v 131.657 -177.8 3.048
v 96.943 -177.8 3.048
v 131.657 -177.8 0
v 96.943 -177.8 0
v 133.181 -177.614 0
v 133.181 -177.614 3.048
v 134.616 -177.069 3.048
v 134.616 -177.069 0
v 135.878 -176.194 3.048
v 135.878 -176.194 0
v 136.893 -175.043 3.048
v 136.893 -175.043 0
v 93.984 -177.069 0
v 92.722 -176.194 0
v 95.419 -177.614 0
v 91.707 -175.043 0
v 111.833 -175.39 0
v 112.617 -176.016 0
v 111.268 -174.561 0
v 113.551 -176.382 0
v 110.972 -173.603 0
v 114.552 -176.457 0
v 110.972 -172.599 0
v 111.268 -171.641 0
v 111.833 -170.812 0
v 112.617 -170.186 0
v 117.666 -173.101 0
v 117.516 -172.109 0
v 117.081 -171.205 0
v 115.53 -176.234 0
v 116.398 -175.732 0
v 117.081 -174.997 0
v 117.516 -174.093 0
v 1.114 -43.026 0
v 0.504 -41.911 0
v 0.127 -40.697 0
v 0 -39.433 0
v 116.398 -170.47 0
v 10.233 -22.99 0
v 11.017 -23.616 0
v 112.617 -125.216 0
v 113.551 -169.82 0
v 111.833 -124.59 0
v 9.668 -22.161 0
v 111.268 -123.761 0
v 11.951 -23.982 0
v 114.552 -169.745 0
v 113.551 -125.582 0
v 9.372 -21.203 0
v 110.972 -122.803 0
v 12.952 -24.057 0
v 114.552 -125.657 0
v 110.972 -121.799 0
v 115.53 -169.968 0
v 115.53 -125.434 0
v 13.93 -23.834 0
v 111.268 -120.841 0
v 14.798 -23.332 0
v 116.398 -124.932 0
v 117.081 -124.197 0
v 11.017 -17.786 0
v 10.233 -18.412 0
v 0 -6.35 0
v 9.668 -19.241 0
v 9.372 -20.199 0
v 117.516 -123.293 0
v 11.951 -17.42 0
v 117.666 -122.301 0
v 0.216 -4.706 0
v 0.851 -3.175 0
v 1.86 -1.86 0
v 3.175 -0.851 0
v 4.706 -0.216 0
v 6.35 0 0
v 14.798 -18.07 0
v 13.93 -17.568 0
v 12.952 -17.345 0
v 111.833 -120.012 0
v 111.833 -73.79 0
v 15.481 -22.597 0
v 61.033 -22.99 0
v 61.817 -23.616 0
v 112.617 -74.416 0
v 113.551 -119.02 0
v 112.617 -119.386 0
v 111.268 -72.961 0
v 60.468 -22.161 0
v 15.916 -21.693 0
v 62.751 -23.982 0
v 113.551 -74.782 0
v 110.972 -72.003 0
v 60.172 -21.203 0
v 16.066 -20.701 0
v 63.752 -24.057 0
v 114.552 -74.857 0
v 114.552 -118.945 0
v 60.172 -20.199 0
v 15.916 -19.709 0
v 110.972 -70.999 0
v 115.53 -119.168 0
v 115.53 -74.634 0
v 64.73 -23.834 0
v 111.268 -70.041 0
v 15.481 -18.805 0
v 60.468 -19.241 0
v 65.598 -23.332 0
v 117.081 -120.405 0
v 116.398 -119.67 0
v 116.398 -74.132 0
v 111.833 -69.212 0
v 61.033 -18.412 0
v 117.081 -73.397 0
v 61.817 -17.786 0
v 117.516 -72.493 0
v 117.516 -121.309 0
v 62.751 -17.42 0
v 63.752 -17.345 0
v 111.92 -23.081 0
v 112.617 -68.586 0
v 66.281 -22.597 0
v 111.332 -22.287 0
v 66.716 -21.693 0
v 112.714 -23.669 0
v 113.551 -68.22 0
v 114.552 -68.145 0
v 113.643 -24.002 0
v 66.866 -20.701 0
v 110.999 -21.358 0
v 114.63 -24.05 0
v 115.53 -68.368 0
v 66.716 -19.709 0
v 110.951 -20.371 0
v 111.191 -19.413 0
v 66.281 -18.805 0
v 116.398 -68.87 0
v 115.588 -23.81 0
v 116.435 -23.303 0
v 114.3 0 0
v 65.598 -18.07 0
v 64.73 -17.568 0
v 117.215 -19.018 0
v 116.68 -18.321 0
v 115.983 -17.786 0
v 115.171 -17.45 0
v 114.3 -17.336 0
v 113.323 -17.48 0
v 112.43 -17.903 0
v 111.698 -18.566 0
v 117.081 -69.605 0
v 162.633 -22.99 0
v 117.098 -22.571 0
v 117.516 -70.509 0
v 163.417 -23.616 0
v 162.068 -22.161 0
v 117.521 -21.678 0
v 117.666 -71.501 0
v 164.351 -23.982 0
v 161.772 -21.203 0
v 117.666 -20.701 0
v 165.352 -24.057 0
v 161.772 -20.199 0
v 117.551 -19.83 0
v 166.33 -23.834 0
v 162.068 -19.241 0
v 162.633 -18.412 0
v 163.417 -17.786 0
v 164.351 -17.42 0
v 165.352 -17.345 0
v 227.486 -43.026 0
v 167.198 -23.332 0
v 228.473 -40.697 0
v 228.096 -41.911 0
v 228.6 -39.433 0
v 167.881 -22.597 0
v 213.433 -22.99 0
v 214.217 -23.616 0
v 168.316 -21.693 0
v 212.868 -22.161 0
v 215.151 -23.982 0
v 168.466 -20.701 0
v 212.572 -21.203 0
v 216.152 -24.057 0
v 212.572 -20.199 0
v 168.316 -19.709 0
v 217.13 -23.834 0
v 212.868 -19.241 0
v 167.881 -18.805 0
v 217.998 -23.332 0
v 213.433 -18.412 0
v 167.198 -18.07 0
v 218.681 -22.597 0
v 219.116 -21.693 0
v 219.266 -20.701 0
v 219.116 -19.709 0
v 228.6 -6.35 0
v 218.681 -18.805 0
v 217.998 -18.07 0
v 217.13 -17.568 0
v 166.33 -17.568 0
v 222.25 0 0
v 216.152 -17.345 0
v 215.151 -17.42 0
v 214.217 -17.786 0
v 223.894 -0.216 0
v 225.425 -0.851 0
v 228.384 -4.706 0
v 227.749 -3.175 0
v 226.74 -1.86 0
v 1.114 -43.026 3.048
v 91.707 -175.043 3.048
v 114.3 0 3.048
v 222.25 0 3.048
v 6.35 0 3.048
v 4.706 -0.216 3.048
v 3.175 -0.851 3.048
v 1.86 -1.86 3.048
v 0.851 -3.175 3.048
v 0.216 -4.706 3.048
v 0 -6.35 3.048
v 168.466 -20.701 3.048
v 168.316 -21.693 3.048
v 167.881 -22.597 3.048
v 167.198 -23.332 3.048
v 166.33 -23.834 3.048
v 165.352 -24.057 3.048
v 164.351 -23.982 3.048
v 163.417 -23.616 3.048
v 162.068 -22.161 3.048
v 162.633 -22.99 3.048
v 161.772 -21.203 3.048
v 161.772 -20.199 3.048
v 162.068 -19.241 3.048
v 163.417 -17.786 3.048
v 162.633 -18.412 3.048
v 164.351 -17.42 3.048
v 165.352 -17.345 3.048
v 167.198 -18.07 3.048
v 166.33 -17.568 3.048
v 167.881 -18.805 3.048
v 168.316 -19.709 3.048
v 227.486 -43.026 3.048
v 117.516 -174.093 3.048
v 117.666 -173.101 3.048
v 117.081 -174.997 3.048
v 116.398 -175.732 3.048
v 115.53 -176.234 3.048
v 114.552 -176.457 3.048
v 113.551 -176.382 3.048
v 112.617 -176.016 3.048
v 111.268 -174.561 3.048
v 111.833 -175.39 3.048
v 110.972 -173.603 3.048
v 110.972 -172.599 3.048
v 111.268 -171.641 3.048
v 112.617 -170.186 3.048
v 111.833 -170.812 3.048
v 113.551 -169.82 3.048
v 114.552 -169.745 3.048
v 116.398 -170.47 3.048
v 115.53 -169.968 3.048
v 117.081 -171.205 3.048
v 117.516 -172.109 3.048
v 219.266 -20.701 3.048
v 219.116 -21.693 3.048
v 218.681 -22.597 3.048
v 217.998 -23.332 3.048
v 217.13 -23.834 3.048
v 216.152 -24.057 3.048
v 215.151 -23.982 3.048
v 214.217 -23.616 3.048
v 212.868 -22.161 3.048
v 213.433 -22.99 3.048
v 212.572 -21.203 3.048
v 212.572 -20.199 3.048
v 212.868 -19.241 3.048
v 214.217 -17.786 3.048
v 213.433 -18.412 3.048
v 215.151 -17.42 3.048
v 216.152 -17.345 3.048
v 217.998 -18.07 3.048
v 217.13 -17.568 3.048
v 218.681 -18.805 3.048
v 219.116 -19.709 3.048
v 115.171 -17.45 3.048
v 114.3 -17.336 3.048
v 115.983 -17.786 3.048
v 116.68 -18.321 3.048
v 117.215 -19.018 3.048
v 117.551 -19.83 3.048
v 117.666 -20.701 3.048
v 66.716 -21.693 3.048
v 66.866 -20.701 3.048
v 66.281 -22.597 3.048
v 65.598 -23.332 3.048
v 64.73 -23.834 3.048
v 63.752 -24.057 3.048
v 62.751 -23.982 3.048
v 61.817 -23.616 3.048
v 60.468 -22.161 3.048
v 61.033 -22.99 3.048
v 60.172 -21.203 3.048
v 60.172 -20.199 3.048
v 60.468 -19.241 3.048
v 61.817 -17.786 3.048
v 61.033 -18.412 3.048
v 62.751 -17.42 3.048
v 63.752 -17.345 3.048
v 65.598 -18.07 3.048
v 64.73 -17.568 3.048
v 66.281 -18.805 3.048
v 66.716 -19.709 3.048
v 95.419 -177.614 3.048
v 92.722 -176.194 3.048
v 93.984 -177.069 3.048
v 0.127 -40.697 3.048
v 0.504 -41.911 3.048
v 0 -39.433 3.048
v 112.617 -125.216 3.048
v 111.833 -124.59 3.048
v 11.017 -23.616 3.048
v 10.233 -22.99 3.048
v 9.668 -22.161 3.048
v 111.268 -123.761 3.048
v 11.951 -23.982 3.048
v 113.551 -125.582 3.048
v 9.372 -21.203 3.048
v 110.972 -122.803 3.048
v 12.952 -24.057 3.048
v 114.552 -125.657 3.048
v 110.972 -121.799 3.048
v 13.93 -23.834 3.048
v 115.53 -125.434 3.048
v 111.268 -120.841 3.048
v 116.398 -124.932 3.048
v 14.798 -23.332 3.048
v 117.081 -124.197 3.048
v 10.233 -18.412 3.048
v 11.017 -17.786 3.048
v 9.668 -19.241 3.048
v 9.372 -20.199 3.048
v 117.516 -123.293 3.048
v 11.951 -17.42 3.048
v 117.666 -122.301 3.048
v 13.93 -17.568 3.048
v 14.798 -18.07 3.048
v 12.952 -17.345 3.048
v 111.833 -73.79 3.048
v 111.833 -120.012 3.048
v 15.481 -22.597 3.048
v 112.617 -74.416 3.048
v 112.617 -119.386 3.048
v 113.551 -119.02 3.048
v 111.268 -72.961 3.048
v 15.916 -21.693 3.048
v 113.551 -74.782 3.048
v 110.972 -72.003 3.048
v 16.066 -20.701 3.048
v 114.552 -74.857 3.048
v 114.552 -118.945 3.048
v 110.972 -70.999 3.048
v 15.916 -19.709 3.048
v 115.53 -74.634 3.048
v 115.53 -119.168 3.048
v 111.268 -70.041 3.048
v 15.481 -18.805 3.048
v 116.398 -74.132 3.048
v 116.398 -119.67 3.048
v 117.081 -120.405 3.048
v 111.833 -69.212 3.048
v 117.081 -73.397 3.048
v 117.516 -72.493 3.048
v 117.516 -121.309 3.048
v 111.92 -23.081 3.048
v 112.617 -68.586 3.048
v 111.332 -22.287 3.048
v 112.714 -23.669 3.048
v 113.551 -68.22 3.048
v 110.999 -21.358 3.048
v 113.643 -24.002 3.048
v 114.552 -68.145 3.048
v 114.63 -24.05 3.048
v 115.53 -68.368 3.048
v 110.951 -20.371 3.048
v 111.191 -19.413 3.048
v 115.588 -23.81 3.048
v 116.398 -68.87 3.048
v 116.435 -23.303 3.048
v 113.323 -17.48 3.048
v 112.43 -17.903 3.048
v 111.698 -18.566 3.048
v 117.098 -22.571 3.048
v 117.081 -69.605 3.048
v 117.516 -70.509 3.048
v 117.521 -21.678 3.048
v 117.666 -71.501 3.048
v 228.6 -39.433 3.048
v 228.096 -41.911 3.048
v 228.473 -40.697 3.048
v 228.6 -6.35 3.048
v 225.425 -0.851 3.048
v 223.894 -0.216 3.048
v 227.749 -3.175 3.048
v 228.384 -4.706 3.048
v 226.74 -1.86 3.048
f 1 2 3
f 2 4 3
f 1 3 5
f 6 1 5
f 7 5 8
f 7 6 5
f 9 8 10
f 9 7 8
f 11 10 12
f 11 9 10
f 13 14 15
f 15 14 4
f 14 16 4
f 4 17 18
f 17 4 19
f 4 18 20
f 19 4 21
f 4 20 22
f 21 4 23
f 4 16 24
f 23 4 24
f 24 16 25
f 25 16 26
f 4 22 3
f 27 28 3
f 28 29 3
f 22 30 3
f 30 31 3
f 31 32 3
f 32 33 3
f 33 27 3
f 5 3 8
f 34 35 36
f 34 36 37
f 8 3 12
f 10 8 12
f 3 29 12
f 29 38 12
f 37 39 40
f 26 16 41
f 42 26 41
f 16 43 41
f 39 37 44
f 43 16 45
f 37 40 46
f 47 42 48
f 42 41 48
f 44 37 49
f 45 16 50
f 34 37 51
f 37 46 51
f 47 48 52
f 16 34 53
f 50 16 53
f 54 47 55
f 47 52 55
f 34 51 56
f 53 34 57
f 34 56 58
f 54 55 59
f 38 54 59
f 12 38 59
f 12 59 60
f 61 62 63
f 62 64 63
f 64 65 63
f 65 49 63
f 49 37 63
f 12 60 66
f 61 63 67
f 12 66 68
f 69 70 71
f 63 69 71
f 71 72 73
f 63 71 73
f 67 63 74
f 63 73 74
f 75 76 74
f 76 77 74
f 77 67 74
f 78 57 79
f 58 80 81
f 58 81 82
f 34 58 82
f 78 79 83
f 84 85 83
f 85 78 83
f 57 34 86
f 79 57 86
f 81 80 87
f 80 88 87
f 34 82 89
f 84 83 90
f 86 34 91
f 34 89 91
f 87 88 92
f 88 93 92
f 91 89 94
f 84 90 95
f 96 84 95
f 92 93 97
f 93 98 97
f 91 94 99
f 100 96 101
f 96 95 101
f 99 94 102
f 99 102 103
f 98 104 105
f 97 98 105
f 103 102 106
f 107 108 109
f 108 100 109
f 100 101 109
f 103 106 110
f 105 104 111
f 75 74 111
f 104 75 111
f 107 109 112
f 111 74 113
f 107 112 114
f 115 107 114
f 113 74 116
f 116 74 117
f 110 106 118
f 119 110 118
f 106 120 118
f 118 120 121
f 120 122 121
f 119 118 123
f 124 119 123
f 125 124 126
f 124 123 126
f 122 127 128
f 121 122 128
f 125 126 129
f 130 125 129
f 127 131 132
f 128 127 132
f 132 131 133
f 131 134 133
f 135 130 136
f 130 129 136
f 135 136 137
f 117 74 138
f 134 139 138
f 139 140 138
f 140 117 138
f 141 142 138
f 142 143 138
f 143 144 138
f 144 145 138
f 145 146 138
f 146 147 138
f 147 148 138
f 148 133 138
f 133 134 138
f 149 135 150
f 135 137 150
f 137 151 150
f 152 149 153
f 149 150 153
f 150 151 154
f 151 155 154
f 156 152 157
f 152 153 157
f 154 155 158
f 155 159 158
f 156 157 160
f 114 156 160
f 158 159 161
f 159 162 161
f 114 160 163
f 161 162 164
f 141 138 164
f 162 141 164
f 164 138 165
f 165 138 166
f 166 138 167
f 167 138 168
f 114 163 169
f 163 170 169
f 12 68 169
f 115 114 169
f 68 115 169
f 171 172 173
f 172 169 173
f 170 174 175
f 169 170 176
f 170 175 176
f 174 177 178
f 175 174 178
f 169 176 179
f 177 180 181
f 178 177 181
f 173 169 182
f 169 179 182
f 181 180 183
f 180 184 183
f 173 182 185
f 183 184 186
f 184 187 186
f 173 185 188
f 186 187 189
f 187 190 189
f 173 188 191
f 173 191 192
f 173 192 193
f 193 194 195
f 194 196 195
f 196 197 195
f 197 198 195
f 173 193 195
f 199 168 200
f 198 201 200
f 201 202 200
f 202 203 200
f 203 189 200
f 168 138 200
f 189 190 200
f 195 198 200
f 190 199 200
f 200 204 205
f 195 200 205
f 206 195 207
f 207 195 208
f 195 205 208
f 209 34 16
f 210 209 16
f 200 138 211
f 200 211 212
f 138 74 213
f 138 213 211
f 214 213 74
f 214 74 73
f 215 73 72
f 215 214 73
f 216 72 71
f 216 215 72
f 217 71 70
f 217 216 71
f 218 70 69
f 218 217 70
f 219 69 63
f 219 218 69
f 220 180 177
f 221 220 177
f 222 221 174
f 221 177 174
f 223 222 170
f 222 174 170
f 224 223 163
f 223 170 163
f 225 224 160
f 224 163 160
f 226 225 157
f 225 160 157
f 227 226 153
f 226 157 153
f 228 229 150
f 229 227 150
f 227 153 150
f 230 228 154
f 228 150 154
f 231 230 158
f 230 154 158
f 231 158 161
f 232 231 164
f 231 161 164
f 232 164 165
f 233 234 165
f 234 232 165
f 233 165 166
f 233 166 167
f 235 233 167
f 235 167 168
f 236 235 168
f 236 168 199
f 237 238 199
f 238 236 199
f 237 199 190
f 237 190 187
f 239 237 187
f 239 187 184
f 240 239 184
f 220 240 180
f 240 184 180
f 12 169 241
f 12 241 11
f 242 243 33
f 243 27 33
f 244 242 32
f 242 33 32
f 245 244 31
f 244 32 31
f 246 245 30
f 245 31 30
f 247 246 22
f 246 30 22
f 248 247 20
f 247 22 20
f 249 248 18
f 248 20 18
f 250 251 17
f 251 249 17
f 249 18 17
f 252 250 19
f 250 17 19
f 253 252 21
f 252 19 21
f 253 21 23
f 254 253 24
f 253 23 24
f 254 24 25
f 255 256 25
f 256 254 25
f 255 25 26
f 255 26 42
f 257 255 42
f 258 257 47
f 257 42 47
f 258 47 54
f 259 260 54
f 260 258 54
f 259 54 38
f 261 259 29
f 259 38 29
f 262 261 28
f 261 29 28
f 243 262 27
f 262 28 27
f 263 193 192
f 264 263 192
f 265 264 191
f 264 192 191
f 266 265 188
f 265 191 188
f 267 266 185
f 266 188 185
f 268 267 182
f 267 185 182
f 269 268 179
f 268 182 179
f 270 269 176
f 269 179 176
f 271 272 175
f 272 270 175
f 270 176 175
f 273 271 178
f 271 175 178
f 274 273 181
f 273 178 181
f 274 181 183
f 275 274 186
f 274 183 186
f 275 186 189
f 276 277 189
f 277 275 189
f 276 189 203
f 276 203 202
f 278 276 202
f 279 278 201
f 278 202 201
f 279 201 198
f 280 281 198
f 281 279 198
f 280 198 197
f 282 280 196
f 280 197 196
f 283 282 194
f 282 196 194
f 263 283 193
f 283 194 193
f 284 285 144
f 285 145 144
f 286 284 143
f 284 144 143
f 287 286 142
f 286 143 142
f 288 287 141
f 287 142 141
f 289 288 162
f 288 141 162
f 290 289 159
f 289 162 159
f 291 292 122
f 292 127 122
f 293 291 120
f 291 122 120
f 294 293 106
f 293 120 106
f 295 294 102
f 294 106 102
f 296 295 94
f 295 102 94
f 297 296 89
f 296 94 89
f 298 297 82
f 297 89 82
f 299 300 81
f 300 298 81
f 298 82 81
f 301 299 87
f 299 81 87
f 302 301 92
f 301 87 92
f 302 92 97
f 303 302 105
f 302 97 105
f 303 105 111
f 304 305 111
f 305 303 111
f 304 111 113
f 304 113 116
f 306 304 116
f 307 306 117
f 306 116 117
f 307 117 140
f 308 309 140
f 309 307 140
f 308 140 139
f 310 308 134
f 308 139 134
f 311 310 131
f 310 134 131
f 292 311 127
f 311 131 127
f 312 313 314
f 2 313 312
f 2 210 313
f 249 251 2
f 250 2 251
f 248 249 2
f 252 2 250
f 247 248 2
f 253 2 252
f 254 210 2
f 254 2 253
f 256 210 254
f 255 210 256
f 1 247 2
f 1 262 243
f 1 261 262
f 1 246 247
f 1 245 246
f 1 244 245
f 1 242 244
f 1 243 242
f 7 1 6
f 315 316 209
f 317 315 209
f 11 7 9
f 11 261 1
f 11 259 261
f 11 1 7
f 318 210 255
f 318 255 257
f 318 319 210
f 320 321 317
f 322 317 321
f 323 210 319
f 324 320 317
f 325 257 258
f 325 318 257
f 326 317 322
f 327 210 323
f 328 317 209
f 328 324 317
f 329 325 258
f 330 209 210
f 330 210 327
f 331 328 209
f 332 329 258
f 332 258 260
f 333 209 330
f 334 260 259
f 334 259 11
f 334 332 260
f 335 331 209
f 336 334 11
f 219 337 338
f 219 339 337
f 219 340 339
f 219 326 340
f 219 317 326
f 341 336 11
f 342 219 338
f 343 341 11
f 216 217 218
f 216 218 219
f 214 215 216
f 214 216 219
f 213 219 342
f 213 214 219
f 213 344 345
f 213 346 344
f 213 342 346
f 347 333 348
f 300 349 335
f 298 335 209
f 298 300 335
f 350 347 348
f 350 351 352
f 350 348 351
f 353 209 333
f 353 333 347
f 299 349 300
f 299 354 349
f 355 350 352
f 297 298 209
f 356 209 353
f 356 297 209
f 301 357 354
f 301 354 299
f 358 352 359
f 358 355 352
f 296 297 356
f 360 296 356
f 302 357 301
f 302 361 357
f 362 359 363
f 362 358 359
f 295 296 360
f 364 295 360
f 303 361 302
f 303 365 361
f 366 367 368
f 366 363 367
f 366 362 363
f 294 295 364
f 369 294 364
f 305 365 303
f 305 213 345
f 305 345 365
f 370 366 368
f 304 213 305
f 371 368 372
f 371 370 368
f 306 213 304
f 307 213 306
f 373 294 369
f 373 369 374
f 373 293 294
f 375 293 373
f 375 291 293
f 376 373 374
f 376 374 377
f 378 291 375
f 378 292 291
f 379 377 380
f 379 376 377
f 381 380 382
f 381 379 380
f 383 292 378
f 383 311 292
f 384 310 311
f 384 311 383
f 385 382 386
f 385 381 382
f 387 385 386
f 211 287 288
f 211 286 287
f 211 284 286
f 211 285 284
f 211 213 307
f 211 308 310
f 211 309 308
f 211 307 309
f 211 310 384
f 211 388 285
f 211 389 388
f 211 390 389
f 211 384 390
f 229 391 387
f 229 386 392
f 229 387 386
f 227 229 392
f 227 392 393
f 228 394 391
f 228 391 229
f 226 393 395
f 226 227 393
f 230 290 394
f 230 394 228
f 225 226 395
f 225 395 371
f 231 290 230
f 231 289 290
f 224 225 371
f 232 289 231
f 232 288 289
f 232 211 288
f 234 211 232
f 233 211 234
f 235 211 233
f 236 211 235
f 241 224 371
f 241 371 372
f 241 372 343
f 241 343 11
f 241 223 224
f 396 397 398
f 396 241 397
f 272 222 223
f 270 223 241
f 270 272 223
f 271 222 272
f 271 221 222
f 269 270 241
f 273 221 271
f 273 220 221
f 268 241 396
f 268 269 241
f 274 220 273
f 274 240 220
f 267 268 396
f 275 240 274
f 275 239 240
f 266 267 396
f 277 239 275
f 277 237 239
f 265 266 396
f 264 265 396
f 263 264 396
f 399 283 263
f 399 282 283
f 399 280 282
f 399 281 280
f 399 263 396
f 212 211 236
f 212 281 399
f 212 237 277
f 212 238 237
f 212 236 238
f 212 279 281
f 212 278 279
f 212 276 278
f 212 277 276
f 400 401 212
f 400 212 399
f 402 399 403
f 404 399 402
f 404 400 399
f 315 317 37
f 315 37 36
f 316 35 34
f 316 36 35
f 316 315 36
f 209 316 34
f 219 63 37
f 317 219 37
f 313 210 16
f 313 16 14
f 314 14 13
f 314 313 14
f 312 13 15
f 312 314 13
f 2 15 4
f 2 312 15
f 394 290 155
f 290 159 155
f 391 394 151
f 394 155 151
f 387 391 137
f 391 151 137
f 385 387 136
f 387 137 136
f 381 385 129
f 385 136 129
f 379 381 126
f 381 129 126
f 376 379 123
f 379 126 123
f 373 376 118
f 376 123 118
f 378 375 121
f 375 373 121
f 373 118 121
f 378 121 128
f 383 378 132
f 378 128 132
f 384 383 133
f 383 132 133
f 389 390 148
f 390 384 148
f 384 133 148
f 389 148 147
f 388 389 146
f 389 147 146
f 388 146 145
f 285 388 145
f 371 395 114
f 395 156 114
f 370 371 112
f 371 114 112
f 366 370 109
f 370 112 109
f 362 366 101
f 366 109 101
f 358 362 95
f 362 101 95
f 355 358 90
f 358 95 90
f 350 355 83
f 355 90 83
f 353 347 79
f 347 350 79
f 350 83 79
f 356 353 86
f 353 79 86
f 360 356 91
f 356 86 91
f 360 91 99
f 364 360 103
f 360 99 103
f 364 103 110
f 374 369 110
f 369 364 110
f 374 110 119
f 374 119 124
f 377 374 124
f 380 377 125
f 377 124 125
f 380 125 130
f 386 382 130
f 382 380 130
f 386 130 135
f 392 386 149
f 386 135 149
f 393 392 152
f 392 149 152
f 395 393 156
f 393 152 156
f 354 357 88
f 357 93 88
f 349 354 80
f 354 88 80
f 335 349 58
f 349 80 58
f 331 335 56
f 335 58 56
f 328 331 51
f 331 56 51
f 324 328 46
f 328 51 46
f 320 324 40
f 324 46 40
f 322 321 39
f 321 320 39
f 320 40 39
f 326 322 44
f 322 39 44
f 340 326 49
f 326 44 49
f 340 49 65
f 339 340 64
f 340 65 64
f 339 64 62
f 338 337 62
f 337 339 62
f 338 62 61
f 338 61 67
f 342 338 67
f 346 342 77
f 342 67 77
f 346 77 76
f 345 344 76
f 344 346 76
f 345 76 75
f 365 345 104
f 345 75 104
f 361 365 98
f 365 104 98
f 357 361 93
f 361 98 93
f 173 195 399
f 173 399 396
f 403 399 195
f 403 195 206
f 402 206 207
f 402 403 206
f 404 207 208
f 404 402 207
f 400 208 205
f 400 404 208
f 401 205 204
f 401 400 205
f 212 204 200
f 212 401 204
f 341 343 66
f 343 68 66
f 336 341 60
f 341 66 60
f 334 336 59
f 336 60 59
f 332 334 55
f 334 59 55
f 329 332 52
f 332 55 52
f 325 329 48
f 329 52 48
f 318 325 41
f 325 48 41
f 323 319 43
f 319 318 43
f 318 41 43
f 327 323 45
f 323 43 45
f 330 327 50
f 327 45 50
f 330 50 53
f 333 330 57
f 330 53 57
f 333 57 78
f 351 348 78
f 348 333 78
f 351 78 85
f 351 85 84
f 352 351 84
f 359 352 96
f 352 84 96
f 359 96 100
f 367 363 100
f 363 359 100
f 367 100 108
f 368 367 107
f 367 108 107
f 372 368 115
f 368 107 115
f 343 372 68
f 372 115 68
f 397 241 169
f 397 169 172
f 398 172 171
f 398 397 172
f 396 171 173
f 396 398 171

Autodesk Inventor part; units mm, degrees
ref_plane "YZ Plane" through (0, 0, 0) normal (1, 0, 0) x (0, 1, 0)
ref_plane "XZ Plane" through (0, 0, 0) normal (0, 1, 0) x (-1, 0, 0)
ref_plane "XY Plane" through (0, 0, 0) normal (0, 0, 1) x (1, 0, 0)
sketch "Sketch1" plane through (0, 0, 0) normal (0, 0, 1) x (1, 0, 0)
  line L0 (0, 0) -> (228.6, 0)
  line L1 (0, 0) -> (0, -41.402)
  line L2 (228.6, 0) -> (228.6, -41.402)
  line L3 (93.599, -177.8) -> (135.001, -177.8)
  line L4 (0, -41.402) -> (93.599, -177.8)
  line L5 (228.6, -41.402) -> (135.001, -177.8)
  circle A0 centre (215.9, -20.701) radius 3.3655
  circle A1 centre (165.1, -20.701) radius 3.3655
  circle A2 centre (114.3, -20.701) radius 3.3655
  circle A3 centre (63.5, -20.701) radius 3.3655
  circle A4 centre (12.7, -20.701) radius 3.3655
  line L6 (114.3, 0) -> (114.3, -20.701)
  circle A5 centre (114.3, -71.501) radius 3.3655
  circle A6 centre (114.3, -122.301) radius 3.3655
  circle A7 centre (114.3, -173.101) radius 3.3655
  dimension "d0" = 228.6
  dimension "d6" = 41.402
  dimension "d7" = 41.402
  dimension "d8" = 41.402
  dimension "d9" = 177.8
  dimension "d11" = 93.599
  dimension "d13" = 6.731
  dimension "d14" = 12.7
  dimension "d15" = 20.701
  dimension "d18" = 50.8
  dimension "d25" = 50.8
extrude "Plate1" add sketch "Sketch1" along normal blind 3.048
fillet "Corner Round1" radius 6.35 6 edges at (0, 0, 1.524) (0, -41.402, 1.524) (228.6, 0, 1.524) (228.6, -41.402, 1.524) (135.001, -177.8, 1.524) (93.599, -177.8, 1.524)
equation "\"d15\" = 0.5 * d6"
equation "\"BendRadius\" = Thickness"
equation "\"BendReliefWidth\" = Thickness"
equation "\"BendReliefDepth\" = 0.5 * Thickness"
equation "\"CornerReliefSize\" = 4 * Thickness"
equation "\"MinimumRemnant\" = 2 * Thickness"
equation "\"TransitionRadius\" = BendRadius"
equation "\"JacobiRadiusSize\" = BendRadius"
equation "\"GapSize\" = Thickness"
equation "\"d30\" = BendRadius"
equation "\"Thickness\" = 3.048"
properties part number "super4"
